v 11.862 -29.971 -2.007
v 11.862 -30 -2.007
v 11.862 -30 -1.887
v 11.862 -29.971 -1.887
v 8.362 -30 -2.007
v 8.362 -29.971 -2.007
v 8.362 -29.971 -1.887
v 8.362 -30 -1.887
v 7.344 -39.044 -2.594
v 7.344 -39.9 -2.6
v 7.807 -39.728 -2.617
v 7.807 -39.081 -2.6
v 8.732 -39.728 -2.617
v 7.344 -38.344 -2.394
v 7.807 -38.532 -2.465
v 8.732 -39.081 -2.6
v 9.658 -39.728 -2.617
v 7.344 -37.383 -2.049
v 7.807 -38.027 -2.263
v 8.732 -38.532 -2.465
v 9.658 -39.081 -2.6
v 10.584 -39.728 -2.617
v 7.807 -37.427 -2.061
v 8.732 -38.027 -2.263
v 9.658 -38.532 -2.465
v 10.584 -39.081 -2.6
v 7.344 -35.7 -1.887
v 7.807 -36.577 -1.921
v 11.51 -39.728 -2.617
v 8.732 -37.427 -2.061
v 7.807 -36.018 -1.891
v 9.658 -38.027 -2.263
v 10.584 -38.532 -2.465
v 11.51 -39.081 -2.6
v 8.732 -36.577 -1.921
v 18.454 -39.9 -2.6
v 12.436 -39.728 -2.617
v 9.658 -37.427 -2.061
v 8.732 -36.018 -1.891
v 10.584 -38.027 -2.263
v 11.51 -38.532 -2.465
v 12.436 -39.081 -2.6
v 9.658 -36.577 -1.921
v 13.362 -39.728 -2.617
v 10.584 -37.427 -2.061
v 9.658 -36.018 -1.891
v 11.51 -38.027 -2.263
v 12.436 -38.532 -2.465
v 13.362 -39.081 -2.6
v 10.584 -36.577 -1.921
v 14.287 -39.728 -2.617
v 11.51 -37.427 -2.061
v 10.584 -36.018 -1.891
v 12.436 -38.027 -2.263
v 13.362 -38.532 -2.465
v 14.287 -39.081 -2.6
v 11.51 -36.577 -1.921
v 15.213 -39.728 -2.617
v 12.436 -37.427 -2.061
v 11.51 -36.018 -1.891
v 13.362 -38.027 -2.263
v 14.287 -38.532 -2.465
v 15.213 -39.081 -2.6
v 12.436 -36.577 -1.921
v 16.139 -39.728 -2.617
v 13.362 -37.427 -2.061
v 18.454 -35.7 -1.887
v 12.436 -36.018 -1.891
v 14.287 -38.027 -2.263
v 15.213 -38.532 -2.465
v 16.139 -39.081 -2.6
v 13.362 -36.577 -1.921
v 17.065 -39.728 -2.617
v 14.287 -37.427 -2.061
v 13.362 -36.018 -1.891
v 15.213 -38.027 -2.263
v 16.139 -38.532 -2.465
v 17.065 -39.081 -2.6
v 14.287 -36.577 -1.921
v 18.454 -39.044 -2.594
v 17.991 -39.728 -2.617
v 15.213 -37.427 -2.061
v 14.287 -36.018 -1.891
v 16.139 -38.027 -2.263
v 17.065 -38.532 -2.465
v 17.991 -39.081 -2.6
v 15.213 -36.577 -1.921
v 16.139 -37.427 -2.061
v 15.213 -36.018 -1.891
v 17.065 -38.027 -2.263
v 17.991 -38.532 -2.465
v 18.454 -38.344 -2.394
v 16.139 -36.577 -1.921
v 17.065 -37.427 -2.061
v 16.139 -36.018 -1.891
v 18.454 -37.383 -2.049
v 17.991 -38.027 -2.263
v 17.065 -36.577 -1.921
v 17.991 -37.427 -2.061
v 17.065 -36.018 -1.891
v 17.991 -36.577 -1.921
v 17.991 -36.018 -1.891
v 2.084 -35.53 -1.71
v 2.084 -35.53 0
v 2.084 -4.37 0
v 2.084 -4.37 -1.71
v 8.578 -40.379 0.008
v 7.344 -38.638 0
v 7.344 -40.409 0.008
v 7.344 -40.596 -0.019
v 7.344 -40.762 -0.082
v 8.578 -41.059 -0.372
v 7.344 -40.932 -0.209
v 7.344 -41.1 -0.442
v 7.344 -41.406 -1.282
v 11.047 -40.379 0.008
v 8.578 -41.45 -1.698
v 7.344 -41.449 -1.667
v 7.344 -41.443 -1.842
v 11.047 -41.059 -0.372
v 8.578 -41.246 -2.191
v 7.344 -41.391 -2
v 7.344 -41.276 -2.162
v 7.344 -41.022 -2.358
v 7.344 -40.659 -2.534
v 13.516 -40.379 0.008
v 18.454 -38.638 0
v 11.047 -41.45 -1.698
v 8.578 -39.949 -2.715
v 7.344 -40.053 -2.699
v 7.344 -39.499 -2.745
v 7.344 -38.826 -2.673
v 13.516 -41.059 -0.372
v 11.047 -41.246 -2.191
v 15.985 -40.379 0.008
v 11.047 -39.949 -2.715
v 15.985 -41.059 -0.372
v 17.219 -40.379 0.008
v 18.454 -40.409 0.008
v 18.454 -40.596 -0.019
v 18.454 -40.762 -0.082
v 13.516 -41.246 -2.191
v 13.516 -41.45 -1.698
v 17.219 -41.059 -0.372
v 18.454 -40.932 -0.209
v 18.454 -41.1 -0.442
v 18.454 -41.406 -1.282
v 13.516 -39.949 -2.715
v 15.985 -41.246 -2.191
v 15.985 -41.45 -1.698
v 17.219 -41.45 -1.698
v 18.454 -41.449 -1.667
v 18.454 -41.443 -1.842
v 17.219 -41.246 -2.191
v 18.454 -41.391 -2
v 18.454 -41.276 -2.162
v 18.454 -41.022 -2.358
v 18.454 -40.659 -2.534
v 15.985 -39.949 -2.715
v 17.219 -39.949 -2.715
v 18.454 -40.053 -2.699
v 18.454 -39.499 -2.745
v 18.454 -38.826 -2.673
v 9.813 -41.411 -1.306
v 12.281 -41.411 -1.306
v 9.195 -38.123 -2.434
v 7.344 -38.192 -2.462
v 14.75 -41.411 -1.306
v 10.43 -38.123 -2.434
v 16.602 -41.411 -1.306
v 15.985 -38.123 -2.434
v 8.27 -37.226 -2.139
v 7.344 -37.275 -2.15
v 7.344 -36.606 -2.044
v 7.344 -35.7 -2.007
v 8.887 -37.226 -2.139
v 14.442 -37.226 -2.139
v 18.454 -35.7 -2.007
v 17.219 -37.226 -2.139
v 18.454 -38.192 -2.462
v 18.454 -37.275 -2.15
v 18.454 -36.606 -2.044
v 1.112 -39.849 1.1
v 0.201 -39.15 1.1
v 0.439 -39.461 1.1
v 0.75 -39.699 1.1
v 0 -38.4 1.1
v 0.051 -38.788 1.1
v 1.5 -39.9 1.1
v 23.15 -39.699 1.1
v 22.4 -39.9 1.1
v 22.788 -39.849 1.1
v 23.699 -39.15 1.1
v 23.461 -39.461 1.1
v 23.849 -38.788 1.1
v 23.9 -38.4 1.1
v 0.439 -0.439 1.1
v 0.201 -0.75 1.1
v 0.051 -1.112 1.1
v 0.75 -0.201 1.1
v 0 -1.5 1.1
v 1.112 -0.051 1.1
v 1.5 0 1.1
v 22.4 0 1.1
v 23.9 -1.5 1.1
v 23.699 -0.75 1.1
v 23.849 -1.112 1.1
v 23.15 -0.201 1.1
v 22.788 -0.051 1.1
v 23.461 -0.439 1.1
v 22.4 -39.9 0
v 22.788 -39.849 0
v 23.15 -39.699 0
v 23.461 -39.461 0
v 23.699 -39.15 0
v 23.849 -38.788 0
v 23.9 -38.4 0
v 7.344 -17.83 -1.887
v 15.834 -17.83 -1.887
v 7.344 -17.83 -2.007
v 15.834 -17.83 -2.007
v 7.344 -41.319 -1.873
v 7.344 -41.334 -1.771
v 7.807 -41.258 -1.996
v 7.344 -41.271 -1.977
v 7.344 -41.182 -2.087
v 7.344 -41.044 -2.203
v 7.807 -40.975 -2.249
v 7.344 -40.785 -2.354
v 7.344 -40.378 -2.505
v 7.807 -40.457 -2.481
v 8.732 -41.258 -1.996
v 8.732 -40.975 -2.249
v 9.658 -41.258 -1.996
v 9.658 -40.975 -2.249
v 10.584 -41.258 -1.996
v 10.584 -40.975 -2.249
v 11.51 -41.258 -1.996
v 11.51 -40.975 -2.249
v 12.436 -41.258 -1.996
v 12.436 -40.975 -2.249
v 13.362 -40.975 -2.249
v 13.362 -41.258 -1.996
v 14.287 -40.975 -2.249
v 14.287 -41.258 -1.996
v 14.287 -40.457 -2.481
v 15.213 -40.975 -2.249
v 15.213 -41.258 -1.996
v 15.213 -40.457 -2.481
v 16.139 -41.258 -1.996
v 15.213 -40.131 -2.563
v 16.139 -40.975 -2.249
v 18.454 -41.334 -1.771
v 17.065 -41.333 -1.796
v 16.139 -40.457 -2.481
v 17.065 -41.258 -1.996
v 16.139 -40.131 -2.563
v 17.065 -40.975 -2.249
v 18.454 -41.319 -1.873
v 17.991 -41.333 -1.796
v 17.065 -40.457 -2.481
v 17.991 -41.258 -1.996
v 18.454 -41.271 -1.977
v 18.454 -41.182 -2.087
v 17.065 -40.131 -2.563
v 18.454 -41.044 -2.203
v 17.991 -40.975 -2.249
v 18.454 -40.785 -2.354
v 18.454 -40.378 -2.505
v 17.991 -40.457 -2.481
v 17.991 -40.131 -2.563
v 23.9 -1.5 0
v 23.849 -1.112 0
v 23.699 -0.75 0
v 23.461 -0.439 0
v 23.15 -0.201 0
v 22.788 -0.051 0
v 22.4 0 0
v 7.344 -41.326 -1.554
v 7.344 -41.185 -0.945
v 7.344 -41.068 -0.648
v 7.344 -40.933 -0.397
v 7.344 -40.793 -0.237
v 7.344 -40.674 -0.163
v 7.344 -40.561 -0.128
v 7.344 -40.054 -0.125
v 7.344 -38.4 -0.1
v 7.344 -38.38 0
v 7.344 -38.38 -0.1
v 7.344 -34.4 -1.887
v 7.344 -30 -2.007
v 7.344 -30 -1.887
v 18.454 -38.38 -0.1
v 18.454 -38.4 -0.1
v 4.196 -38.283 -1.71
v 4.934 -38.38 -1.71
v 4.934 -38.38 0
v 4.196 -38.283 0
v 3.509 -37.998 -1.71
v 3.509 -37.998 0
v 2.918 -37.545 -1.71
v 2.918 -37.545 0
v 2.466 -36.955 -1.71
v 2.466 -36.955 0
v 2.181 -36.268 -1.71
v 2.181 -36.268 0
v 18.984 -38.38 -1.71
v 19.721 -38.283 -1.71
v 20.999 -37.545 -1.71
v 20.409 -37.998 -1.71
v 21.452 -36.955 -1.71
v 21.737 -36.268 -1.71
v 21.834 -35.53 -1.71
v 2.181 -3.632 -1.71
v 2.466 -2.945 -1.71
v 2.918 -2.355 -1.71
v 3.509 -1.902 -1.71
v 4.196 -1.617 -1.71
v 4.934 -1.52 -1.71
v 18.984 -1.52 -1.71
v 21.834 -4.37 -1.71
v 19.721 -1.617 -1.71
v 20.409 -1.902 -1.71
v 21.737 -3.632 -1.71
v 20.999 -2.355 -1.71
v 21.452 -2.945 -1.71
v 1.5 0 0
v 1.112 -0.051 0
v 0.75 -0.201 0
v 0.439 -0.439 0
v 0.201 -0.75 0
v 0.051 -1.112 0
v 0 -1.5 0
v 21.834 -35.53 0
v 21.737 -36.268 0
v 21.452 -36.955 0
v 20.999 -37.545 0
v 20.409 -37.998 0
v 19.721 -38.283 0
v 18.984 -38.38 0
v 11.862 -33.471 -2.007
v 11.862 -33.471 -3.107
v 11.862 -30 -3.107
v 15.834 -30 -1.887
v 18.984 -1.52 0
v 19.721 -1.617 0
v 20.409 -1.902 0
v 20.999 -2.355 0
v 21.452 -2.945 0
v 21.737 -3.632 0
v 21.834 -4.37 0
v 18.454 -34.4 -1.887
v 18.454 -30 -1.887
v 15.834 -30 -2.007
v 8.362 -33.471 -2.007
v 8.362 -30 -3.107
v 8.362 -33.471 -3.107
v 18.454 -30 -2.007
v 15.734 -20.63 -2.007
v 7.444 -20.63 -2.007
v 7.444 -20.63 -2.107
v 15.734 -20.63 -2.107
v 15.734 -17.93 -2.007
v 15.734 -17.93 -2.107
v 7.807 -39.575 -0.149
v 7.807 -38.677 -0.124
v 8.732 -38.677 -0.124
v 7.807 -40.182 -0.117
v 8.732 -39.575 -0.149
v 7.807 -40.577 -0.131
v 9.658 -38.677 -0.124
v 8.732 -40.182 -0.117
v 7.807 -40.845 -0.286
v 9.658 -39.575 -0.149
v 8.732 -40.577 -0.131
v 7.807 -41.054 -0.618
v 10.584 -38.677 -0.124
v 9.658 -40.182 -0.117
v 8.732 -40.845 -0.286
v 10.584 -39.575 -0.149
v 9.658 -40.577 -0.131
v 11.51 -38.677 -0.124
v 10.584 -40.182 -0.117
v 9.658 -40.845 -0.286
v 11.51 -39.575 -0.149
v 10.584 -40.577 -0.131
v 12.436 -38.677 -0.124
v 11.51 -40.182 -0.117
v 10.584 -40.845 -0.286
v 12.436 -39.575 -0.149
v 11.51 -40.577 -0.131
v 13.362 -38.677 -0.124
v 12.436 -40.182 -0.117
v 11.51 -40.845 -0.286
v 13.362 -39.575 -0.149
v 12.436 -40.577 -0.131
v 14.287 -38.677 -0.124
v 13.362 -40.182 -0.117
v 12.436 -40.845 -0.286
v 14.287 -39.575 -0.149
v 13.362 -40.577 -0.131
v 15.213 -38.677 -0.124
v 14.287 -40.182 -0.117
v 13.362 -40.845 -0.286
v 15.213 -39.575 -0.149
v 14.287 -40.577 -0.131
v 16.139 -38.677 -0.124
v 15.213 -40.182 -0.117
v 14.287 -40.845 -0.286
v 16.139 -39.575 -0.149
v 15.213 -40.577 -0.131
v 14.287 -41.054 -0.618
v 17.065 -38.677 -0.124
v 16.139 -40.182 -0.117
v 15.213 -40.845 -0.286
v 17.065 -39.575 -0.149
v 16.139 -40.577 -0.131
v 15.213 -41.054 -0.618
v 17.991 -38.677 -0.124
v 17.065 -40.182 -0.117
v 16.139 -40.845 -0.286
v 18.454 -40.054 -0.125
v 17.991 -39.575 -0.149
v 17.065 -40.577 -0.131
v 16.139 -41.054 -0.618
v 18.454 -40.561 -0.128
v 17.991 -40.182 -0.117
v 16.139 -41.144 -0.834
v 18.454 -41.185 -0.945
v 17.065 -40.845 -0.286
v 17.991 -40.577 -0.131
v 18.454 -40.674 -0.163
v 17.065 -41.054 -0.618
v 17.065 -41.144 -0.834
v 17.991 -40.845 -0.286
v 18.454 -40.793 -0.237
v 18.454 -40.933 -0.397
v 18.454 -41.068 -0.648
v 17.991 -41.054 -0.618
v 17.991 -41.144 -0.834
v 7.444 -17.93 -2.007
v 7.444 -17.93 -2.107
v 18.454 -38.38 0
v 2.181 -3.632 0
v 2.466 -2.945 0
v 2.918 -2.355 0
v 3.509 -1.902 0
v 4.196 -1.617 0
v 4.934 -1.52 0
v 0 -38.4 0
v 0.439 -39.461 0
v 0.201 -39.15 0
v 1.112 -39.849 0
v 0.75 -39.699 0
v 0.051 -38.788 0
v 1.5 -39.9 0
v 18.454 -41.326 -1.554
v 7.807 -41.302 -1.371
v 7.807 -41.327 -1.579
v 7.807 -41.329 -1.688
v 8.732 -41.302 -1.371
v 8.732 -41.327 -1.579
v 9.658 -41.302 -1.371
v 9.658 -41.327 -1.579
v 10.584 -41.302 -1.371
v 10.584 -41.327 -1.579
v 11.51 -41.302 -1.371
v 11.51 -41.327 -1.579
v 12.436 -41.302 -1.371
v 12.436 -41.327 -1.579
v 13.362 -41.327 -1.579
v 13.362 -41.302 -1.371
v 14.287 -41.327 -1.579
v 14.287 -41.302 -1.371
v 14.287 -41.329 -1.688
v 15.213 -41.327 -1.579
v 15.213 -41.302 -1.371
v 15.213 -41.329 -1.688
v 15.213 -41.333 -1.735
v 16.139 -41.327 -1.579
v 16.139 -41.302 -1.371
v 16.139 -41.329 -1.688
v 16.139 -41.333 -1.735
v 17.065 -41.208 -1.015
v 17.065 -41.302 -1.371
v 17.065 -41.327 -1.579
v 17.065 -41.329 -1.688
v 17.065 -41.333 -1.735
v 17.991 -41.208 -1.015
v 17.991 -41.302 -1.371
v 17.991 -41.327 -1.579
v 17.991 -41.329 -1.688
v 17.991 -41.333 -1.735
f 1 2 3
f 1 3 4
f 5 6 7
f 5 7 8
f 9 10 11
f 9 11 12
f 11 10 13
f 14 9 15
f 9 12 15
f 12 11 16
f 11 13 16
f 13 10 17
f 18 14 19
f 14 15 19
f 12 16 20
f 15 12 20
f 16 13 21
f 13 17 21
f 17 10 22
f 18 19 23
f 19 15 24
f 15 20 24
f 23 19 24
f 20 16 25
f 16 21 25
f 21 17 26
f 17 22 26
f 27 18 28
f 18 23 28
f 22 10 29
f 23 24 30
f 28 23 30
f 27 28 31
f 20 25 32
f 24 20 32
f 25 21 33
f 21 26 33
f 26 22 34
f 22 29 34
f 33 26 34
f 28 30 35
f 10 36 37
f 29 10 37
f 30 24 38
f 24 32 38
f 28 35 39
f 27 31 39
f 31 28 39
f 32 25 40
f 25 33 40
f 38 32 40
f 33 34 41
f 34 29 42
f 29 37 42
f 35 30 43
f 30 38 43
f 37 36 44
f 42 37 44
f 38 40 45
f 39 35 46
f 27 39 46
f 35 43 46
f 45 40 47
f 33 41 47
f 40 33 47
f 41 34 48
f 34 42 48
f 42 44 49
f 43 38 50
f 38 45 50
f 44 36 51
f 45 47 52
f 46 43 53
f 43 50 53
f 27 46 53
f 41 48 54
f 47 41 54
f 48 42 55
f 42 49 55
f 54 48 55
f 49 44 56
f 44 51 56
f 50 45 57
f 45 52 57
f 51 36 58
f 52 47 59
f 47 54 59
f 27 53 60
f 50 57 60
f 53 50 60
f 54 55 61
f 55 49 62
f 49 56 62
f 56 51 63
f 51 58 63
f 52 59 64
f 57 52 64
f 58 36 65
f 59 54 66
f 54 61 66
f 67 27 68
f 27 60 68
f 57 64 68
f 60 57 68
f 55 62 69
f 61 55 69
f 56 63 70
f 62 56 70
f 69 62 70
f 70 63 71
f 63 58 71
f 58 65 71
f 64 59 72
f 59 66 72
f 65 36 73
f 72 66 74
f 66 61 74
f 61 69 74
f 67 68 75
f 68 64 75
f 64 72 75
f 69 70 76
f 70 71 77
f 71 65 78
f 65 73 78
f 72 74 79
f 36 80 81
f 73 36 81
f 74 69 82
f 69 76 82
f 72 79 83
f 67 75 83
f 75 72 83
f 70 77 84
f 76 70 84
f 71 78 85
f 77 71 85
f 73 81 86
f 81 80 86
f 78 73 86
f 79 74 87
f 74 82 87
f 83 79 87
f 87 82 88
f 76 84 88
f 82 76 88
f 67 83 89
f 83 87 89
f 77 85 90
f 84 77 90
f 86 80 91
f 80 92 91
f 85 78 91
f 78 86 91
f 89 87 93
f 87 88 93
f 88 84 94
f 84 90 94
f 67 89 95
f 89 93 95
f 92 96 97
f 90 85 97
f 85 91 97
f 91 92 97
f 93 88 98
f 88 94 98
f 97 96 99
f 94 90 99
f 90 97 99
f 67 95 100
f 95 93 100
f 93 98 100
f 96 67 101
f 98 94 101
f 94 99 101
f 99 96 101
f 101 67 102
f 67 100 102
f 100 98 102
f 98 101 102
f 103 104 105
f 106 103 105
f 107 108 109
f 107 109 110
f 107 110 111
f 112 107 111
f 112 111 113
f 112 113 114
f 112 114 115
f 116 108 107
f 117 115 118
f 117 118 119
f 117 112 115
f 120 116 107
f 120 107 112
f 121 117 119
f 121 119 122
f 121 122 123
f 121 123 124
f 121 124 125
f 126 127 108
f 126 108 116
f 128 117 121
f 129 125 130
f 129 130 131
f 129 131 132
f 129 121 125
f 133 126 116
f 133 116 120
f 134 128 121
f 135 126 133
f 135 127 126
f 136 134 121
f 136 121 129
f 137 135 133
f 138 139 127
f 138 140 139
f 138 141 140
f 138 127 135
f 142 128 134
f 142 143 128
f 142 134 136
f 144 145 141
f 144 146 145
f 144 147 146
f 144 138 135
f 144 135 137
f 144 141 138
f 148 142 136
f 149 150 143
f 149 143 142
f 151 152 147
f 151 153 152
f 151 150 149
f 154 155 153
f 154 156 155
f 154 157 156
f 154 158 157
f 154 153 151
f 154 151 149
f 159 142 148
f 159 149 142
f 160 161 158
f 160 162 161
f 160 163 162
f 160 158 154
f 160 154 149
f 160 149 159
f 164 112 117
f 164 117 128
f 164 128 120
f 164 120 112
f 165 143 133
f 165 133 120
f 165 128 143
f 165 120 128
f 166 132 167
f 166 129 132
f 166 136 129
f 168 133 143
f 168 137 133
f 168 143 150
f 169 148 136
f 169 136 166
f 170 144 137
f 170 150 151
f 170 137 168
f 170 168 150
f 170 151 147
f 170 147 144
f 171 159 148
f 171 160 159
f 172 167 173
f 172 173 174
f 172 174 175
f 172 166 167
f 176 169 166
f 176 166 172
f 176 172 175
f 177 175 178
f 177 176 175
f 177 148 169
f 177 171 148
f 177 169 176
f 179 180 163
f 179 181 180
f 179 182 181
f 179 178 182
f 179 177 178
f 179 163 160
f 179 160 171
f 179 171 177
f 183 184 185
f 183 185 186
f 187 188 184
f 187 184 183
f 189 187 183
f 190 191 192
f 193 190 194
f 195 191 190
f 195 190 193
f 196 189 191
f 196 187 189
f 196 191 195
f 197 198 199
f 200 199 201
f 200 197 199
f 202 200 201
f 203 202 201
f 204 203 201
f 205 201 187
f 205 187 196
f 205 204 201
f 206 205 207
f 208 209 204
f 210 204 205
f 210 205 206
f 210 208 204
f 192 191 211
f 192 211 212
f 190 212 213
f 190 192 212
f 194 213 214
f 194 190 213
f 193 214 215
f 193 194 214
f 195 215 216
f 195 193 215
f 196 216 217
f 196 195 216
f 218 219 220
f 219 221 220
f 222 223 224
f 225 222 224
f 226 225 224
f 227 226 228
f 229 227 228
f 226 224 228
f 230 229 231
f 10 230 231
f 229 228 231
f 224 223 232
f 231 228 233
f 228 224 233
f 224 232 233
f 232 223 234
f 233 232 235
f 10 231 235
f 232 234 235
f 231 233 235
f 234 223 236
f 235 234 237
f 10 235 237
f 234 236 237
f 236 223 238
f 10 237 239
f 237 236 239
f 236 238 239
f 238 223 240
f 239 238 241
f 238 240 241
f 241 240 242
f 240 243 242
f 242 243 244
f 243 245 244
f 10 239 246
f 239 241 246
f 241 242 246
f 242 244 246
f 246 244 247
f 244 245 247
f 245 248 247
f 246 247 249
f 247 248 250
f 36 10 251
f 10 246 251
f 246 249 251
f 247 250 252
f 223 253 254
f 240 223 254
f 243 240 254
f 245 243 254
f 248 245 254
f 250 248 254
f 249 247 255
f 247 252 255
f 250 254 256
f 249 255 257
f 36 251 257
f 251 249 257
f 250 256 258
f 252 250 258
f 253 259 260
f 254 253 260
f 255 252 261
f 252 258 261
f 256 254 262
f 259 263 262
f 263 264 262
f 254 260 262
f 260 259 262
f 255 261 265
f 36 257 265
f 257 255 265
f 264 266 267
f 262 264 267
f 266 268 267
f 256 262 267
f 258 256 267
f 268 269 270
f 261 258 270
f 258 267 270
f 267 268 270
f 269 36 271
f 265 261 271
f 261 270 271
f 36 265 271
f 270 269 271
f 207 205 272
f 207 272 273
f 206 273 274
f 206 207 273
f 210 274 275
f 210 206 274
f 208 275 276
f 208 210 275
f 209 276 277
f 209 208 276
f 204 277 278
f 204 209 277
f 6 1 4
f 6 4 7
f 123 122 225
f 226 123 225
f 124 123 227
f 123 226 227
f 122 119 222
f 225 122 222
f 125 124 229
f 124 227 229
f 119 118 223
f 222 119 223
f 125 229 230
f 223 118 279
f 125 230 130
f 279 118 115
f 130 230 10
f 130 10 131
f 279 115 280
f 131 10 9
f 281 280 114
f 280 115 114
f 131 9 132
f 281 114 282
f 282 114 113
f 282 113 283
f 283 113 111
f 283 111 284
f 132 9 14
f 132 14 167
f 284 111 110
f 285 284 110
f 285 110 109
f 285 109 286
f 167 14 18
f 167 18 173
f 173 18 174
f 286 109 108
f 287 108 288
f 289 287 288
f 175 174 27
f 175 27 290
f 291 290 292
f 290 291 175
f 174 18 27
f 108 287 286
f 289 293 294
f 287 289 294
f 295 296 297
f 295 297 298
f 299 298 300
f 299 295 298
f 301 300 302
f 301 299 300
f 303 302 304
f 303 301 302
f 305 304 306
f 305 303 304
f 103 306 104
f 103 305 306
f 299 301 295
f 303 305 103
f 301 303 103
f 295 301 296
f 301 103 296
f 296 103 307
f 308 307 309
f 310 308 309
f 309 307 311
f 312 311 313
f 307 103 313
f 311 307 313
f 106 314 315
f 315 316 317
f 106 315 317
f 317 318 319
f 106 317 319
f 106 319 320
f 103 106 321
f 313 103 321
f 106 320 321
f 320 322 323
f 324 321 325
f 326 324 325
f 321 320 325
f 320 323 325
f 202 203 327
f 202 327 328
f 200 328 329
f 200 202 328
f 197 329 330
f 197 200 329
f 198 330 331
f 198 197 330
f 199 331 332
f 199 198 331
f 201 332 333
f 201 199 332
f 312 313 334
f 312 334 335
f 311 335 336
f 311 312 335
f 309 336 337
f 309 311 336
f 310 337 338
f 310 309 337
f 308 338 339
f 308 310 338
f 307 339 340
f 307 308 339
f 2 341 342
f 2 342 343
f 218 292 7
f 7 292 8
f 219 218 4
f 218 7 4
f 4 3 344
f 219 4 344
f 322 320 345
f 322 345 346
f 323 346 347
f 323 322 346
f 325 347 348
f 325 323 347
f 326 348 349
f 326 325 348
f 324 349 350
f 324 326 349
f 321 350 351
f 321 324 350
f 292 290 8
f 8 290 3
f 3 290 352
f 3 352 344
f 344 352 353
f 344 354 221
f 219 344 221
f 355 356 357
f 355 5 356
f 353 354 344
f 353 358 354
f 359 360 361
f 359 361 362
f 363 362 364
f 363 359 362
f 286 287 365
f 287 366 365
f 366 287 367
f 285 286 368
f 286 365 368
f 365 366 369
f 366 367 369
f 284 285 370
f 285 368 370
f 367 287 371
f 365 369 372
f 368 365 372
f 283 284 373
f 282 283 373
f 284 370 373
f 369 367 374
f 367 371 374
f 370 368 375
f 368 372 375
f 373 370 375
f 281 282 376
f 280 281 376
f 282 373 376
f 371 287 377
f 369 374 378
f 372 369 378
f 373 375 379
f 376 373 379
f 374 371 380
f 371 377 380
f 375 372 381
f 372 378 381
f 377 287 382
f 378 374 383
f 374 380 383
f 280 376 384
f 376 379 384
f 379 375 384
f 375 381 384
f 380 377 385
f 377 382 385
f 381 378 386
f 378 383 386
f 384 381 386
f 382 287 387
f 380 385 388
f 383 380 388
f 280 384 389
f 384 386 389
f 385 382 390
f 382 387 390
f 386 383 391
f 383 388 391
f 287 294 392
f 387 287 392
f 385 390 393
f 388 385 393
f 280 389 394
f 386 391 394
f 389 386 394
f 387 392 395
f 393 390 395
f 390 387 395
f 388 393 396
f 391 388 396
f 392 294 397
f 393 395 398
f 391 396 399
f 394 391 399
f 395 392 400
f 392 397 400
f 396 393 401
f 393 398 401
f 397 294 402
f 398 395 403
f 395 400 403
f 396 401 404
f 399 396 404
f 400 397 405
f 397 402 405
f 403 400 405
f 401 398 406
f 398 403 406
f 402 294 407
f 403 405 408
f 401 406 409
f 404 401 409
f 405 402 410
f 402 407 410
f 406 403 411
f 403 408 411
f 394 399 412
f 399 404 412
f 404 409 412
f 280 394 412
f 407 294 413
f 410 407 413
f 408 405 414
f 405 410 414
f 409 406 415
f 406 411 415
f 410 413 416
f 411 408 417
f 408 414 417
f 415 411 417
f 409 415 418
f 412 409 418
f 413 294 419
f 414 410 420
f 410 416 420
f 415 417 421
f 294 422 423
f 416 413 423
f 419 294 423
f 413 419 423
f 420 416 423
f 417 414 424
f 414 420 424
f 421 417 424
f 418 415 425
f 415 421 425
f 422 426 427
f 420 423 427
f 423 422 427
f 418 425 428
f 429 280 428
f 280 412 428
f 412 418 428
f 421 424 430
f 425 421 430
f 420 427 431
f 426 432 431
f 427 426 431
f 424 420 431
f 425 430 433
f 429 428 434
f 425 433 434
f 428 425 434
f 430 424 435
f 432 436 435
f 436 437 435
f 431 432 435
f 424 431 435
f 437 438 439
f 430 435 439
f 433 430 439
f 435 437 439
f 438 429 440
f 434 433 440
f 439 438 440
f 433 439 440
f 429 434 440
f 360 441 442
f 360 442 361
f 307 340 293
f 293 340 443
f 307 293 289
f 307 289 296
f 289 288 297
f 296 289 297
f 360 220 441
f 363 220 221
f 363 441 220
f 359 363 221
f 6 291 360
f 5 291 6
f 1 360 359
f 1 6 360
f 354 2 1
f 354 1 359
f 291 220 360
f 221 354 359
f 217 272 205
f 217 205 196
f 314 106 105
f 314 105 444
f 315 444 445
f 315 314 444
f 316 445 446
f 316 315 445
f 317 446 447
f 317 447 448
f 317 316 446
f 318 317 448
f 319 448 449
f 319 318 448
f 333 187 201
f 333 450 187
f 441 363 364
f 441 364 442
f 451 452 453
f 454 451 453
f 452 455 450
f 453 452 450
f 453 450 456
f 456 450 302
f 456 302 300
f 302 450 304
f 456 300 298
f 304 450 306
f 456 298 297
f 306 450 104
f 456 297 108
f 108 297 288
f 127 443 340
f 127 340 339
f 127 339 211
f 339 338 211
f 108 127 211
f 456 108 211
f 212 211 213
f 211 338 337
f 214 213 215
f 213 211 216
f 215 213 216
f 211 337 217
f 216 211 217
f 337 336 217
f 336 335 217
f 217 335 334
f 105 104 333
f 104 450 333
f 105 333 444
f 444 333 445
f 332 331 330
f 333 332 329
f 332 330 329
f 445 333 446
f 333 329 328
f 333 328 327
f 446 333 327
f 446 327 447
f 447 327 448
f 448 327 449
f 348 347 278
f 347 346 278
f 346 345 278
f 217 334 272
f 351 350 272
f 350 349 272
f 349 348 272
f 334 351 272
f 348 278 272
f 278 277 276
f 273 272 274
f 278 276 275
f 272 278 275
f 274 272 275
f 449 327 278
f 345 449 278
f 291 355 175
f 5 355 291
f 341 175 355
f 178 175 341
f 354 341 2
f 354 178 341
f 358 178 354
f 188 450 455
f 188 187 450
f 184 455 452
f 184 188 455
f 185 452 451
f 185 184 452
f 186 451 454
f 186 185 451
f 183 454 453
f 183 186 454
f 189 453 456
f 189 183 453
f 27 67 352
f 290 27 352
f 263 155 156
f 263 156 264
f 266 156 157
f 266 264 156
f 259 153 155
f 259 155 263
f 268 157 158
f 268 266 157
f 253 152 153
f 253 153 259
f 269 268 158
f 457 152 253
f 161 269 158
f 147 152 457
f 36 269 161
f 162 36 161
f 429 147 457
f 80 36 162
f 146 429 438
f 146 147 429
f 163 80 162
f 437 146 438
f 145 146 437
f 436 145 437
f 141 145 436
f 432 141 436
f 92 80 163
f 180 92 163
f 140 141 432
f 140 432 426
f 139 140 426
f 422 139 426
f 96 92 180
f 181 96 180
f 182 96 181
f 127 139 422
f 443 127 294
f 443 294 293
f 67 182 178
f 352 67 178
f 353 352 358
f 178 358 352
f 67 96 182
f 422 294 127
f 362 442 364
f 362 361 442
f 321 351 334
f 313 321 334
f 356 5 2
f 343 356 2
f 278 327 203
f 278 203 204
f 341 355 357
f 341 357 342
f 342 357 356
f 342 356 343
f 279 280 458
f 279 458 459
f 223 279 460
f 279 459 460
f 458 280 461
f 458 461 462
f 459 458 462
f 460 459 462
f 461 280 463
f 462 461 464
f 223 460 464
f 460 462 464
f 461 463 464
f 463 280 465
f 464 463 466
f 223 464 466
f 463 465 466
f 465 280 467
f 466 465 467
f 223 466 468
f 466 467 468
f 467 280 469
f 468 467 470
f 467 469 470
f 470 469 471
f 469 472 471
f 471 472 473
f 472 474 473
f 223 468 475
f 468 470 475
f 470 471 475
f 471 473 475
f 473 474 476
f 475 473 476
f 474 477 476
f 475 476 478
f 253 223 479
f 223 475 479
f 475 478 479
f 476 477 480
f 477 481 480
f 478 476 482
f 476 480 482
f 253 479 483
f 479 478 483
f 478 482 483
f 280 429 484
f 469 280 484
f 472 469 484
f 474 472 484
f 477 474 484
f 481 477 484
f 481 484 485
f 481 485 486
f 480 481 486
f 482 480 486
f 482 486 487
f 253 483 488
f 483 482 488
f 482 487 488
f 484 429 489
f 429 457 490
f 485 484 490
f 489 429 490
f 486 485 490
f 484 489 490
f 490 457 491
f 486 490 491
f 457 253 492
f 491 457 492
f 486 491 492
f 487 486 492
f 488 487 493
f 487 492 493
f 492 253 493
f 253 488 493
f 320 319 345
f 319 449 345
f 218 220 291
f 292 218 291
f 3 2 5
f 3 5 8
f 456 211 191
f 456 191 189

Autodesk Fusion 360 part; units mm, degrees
sketch "草图1" plane through (0, 0, 0) normal (0, 0, 1) x (1, 0, 0)
  line L0 (0, 0) -> (23.9, 0)
  line L1 (23.9, 0) -> (23.9, -39.9)
  line L2 (23.9, -39.9) -> (0, -39.9)
  line L3 (0, -39.9) -> (0, 0)
  line L4 (7.7265, 0) -> (7.7265, -1.52) construction
  line L5 (0, -5.5) -> (2.0837, -5.5) construction
  line L6 (2.0837, -5.5) -> (2.0837, 0) construction
  line L7 (7.7265, -1.52) -> (0, -1.52) construction
  line L8 (2.0837, -1.52) -> (21.8337, -1.52)
  line L9 (21.8337, -1.52) -> (21.8337, -38.38)
  line L10 (21.8337, -38.38) -> (2.0837, -38.38)
  line L11 (2.0837, -38.38) -> (2.0837, -1.52)
  line L12 (7.1501, -1.52) -> (7.1501, -2.29) construction
  line L13 (2.0837, -3.1305) -> (2.9264, -3.1305) construction
  line L14 (7.1501, -2.29) -> (2.0837, -2.2916) construction
  line L15 (2.9264, -3.1305) -> (2.9251, -1.52) construction
  line L16 (5.4257, -2.2913) -> (18.4729, -2.2913)
  line L17 (20.9729, -4.7913) -> (20.9729, -33.0233)
  line L18 (18.4729, -35.5233) -> (5.4257, -35.5233)
  line L19 (2.9257, -33.0233) -> (2.9257, -4.7913)
  arc A0 (20.9729, -4.7913) -> (18.4729, -2.2913) centre (18.4729, -4.7913) ccw
  arc A1 (5.4257, -2.2913) -> (2.9257, -4.7913) centre (5.4257, -4.7913) ccw
  arc A2 (18.4729, -35.5233) -> (20.9729, -33.0233) centre (18.4729, -33.0233) ccw
  arc A3 (2.9257, -33.0233) -> (5.4257, -35.5233) centre (5.4257, -33.0233) ccw
  point P0 (2.9257, -2.2913)
  point P1 (20.9729, -2.2913)
  point P2 (2.9257, -35.5233)
  dimension "d13" = 23.9
  dimension "d14" = 39.9
  dimension "d15" = 1.52
  dimension "d16" = 2.0837
  dimension "d17" = 19.75
  dimension "d18" = 36.86
  dimension "d19" = 0.77
  dimension "d20" = 0.8427
  dimension "d21" = 18.0472
  dimension "d22" = 33.232
  dimension "d23" = 2.5
  dimension "d24" = 2.5
  dimension "d25" = 2.5
  dimension "d26" = 2.5
extrude "拉伸1" add sketch "草图1" along normal blind 1.1 contours L16 L17 L18 L19 A0 A1 A2 A3 makes body 1
extrude "拉伸2" add sketch "草图1" along normal blind 1.1 separate body contours L0 L1 L2 L3 | L8 L9 L10 L11 makes body 2
extrude "拉伸3" add sketch "草图1" against normal blind 1.71 contours L8 L9 L10 L11 | L16 L17 L18 L19 A0 A1 A2 A3 bodies 1 2
fillet "圆角1" radius 2.85 4 edges at (2.0837, -38.38, -0.855) (21.8337, -38.38, -0.855) (2.0837, -1.52, -0.855) (21.8337, -1.52, -0.855) on bodies 1
fillet "圆角2" radius 1.5 4 edges at (23.9, -39.9, 0.55) (23.9, 0, 0.55) (0, -39.9, 0.55) (0, 0, 0.55) on bodies 1 2
ref_plane "工作平面1" through (18.4537, -19.95, -0.855) normal (1, 0, 0) x (0, -1, 0)
sketch "草图2" plane through (18.4537, 0, 0) normal (1, 0, 0) x (0, 1, 0)
  line L0 (-40.0737, 0.279) -> (-41.3337, 0.279) construction
  line L1 (-41.3337, 0.279) -> (-41.3337, -3.821) construction
  spline S0 degree 5 poles (-38.4, -0.1) (-38.6489, -0.1241) (-39.1066, -0.1572) (-39.6727, -0.1622) (-40.2067, -0.109) (-40.6122, -0.0856) (-40.8776, -0.2486) (-41.0923, -0.6505) (-41.2846, -1.212) (-41.3379, -1.5449) (-41.3206, -1.6651) (-41.3382, -1.7439) (-41.3415, -1.9119) (-41.1691, -2.142) (-40.7884, -2.3881) (-40.2158, -2.5782) (-39.5476, -2.6559) (-38.9632, -2.6102) (-38.484, -2.4652) (-38.0486, -2.2648) (-37.5389, -2.0636) (-36.9662, -1.9445) (-36.3943, -1.8972) (-35.9431, -1.8867) (-35.7, -1.8867) knots 0 0 0 0 0 0 0.05 0.1 0.15 0.2 0.25 0.3 0.35 0.4 0.45 0.5 0.55 0.6 0.65 0.7 0.75 0.8 0.85 0.9 0.95 1 1 1 1 1 1
  line L2 (-40.9429, -0.2435) -> (-41.4268, -1.6476)
  line L3 (-37, -1.8867) -> (-34.4, -1.8867)
  line L4 (-38.4, -1.7) -> (-30.02, -1.7) construction
  line L5 (-35.7, -1.8867) -> (-30, -1.8867)
  line L6 (-40.7, -2.5) -> (-39.1, -2.7)
  line L7 (-41.3337, -1.521) -> (-41.3337, -2.021)
  line L8 (-36.7517, 0.0593) -> (-40.0483, -0.2593)
  spline S1 degree 3 poles (-38.4115, 0.0194) (-39.4337, -0.0793) (-39.9937, 0.0125) (-40.379, 0.0085) (-40.675, 0.0054) (-40.9025, -0.1183) (-41.0589, -0.3717) (-41.2375, -0.6611) (-41.3747, -1.1063) (-41.4209, -1.3536) (-41.4615, -1.5709) (-41.4457, -1.6334) (-41.4503, -1.6981) (-41.4558, -1.7768) (-41.4586, -1.9894) (-41.2464, -2.1914) (-41.0101, -2.4164) (-40.5136, -2.6385) (-39.9494, -2.7146) (-39.4192, -2.7861) (-38.9191, -2.7237) (-38.5229, -2.5886) (-37.963, -2.3978) (-37.5596, -2.1121) (-36.4532, -2.0315) (-36.2299, -2.0152) (-35.9794, -2.0067) (-35.7, -2.0067) knots 0 0 0 0 0.124236 0.124236 0.124236 0.219713 0.219713 0.219713 0.328762 0.328762 0.328762 0.424581 0.424581 0.424581 0.541088 0.541088 0.541088 0.670846 0.670846 0.670846 0.792816 0.792816 0.792816 0.965215 0.965215 0.965215 1 1 1 1
  line L9 (-35.7, -2.0067) -> (-30, -2.0067)
  line L10 (-38.4, -0.1) -> (-38.3802, -0.1)
  line L11 (-38.3802, 0.0197) -> (-38.4115, 0.0194)
  line L12 (-38.3802, -0.1) -> (-38.3802, 0.0197)
  line L13 (-30, -2.0067) -> (-30, -1.8867)
  point P0 (-41.1848, -0.9456)
  point P1 (-41.3337, -1.771)
  point P2 (-39.9, -2.6)
  dimension "d38" = 1.26
  dimension "d39" = 8.38
  dimension "d40" = 0.12
extrude "拉伸4" add sketch "草图2" against normal blind 11.11 bodies 1
sketch "草图3" plane through (0, 0, -2.0067) normal (0, 0, -1) x (1, 0, 0)
  line L0 (18.4537, 30) -> (18.4537, 35.7)
  line L1 (18.4537, 35.7) -> (7.3437, 35.7)
  line L2 (7.3437, 35.7) -> (7.3437, 30)
  line L3 (7.3437, 30) -> (18.4537, 30)
  line L4 (5.7336, 38.371) -> (5.7336, 33.471) construction
  line L5 (5.7336, 33.471) -> (22, 33.471) construction
  line L6 (8.3624, 33.471) -> (11.8624, 33.471)
  line L7 (11.8624, 33.471) -> (11.8624, 29.971)
  line L8 (11.8624, 29.971) -> (8.3624, 29.971)
  line L9 (8.3624, 29.971) -> (8.3624, 33.471)
  line L10 (7.3437, 30) -> (15.8337, 30)
  line L11 (15.8337, 30) -> (15.8337, 17.83)
  line L12 (15.8337, 17.83) -> (7.3437, 17.83)
  line L13 (7.3437, 17.83) -> (7.3437, 30)
  line L14 (15.8337, 17.83) -> (7.3437, 17.83)
  line L15 (7.3437, 17.83) -> (7.3437, 20.73)
  line L16 (7.3437, 20.73) -> (15.8337, 20.73)
  line L17 (15.8337, 20.73) -> (15.8337, 17.83)
  line L18 (15.7337, 17.93) -> (7.4437, 17.93)
  line L19 (7.4437, 17.93) -> (7.4437, 20.63)
  line L20 (7.4437, 20.63) -> (15.7337, 20.63)
  line L21 (15.7337, 20.63) -> (15.7337, 17.93)
  dimension "d43" = 4.9
  dimension "d44" = 3.5
  dimension "d45" = 3.5
  dimension "d48" = 8.49
  dimension "d49" = 12.17
  dimension "d52" = 2.9
  dimension "d53" = 0.1
extrude "拉伸5" add sketch "草图3" along normal blind 1.1 contours L3 L6 L7 L9 L10 bodies 1
extrude "拉伸6" add sketch "草图3" against normal blind 0.12 contours L3 L7 L8 L9 L10 L11 L13 L16 | L11 L12 L13 L14 L15 L16 L17 | L18 L19 L20 L21 bodies 1
extrude "拉伸7" add sketch "草图3" along normal blind 0.1 contours L18 L19 L20 L21 bodies 1
equation "d31 = -2.81 mm + 1.1 mm"
